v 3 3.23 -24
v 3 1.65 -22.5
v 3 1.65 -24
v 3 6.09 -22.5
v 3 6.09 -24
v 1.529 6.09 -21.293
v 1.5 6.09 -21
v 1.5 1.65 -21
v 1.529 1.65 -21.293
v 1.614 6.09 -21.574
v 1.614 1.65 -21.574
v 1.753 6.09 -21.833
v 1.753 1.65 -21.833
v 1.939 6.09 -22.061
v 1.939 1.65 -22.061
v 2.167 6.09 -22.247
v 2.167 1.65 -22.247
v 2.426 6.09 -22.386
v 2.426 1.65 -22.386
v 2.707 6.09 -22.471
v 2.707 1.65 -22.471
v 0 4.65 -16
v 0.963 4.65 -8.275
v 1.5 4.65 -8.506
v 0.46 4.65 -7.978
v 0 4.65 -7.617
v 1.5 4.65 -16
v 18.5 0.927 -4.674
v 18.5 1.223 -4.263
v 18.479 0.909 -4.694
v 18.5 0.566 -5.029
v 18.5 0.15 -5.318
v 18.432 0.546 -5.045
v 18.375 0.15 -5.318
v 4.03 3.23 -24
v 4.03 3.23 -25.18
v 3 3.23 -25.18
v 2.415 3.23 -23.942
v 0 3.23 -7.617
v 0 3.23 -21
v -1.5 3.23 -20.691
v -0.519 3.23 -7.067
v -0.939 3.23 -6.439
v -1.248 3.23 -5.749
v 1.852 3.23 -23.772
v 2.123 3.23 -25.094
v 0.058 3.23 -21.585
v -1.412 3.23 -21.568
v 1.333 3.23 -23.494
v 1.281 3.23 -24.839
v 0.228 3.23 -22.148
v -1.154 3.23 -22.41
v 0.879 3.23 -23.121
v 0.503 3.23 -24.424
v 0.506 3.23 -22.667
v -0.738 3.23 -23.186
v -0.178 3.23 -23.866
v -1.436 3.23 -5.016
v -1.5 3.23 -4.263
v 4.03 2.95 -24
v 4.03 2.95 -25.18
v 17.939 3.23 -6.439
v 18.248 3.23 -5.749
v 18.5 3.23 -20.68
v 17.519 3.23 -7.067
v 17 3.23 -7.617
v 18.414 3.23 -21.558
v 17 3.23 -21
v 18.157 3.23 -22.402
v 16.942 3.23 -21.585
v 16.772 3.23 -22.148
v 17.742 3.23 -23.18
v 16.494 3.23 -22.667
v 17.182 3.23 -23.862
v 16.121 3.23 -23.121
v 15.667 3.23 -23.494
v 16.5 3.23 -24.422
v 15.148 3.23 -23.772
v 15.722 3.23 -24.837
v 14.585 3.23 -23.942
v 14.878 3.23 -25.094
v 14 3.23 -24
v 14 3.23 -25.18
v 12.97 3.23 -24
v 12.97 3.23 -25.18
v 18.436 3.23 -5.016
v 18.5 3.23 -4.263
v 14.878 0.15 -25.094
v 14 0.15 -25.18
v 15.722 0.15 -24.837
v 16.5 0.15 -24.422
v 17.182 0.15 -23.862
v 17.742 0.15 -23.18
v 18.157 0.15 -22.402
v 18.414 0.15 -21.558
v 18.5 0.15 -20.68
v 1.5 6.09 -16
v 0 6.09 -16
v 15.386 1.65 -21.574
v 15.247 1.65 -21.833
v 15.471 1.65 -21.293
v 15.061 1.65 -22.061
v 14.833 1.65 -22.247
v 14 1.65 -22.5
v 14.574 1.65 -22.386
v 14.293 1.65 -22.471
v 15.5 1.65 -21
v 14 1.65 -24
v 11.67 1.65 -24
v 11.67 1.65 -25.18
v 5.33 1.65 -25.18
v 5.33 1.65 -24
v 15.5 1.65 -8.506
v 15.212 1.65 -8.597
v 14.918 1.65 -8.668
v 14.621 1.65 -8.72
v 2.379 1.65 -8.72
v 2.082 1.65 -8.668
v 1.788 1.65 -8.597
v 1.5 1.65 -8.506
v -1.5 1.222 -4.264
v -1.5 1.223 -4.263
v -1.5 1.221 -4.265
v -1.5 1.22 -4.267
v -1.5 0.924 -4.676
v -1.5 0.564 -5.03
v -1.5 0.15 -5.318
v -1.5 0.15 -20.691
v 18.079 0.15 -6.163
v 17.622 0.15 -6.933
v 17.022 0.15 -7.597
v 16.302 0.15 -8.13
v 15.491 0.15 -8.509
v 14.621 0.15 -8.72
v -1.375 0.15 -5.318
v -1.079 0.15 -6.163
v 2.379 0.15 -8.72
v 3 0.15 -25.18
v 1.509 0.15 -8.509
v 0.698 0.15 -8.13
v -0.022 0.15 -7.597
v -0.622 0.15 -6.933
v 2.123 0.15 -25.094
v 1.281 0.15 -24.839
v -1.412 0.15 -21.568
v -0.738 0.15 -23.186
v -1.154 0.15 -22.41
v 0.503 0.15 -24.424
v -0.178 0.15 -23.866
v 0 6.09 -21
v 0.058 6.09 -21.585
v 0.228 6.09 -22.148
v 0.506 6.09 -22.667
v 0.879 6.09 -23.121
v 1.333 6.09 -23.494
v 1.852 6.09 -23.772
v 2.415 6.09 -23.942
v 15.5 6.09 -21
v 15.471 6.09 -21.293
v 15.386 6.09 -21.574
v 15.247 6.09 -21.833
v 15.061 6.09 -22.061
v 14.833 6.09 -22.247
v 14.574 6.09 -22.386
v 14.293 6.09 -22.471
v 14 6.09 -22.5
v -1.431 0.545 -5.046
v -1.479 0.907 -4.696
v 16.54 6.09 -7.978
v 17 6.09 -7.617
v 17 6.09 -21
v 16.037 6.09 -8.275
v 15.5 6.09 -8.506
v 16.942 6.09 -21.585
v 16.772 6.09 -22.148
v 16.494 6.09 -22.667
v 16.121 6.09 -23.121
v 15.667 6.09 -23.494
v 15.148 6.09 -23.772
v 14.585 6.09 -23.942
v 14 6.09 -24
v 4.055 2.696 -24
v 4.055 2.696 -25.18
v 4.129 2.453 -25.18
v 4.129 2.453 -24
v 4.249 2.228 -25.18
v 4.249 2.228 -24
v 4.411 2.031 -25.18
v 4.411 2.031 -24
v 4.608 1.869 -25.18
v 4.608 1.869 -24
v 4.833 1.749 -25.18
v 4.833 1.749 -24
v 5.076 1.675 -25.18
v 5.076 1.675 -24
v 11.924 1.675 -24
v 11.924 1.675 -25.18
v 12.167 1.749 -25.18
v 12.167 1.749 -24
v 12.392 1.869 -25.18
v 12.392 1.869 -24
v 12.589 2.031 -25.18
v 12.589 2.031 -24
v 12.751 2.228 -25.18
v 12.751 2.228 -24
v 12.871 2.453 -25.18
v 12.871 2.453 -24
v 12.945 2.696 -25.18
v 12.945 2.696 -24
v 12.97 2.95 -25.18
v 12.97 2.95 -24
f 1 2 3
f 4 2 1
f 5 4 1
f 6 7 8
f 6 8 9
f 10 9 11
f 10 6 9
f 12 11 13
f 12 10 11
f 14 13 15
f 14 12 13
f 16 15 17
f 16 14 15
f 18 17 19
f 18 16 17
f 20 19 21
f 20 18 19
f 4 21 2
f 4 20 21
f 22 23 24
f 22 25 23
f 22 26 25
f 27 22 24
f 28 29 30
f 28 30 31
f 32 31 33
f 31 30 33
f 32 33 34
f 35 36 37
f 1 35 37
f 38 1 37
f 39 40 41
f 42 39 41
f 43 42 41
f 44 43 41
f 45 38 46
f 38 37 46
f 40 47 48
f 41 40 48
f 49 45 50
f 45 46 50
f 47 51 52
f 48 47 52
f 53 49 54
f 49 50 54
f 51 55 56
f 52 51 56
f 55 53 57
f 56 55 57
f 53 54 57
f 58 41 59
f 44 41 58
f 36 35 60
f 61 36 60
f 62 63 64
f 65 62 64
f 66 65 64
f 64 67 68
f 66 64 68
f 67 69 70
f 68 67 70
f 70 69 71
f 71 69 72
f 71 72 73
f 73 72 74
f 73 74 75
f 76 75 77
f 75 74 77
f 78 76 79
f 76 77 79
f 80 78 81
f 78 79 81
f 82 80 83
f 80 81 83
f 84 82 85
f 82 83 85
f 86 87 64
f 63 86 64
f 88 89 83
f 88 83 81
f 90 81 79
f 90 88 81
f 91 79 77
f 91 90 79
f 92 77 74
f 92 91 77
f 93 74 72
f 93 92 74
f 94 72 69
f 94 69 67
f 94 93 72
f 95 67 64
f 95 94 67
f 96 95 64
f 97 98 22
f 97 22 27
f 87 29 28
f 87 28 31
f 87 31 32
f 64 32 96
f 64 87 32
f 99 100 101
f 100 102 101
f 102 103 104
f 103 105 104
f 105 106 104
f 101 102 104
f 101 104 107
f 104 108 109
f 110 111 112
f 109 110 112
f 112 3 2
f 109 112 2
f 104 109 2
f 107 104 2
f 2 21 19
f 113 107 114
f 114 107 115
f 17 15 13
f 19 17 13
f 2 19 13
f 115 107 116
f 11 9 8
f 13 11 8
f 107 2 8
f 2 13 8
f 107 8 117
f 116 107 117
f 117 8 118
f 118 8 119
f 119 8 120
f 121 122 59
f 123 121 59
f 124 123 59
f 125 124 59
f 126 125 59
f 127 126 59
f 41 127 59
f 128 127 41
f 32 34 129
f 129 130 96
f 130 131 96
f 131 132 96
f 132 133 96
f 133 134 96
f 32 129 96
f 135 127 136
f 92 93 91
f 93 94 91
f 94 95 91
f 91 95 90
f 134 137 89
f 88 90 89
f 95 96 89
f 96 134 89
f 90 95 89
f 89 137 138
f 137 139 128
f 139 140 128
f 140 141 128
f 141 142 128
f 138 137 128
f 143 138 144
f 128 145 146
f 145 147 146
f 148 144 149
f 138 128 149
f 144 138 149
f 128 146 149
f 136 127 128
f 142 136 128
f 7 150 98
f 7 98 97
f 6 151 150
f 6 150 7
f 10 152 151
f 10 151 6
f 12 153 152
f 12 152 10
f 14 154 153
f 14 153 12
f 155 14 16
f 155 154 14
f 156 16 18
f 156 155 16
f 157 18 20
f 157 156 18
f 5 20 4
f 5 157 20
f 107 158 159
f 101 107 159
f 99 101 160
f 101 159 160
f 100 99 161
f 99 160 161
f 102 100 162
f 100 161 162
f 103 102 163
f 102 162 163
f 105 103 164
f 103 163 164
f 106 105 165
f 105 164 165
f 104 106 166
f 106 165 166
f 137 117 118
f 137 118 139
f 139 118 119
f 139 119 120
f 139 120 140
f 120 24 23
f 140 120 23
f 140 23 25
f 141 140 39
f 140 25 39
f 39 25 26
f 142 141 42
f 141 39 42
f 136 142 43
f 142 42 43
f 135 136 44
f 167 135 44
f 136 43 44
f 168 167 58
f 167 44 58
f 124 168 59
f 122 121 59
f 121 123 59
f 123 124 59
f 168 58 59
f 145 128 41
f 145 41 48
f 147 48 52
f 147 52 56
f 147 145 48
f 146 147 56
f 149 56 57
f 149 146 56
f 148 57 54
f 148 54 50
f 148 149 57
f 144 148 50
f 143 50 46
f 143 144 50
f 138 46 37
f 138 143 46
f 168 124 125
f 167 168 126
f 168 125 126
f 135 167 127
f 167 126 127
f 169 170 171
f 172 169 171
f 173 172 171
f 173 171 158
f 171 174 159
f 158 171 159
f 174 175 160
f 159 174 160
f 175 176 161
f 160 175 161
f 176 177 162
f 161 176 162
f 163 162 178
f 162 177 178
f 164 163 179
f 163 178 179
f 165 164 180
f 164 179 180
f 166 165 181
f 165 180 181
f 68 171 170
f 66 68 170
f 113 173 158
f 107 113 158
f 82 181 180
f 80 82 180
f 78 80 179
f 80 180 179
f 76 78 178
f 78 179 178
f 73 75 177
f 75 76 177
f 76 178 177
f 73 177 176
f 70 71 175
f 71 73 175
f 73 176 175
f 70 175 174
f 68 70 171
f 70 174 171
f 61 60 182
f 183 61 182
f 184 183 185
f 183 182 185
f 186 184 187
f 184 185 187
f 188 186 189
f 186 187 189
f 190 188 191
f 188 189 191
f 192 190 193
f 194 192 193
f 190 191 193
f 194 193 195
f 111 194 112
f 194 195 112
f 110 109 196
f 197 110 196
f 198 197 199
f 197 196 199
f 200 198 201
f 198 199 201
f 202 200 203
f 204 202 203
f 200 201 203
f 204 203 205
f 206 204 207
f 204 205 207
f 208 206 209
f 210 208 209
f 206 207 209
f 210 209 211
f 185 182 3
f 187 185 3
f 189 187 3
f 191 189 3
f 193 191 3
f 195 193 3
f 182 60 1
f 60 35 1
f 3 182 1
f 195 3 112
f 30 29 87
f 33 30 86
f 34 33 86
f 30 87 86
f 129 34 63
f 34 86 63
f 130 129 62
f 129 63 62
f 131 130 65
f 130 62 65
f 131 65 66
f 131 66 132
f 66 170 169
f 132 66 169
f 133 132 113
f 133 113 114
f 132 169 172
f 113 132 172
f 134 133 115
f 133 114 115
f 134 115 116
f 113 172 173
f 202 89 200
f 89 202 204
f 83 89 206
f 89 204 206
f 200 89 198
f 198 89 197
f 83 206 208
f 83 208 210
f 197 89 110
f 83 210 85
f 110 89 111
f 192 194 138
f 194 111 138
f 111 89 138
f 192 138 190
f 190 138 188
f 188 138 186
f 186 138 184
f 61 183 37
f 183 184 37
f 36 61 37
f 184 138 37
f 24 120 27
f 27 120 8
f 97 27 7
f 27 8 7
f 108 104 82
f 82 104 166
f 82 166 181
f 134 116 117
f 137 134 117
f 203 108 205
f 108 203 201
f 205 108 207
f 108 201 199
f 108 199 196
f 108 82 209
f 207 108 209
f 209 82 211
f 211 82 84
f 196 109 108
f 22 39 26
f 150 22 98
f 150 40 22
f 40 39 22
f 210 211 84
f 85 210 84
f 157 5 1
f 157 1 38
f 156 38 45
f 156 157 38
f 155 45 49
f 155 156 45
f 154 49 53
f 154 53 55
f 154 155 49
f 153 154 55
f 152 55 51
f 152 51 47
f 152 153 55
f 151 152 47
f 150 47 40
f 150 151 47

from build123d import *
from OCP.BRepAlgoAPI import BRepAlgoAPI_Cut
from OCP.TopTools import TopTools_ListOfShape

# Parameters (mm, degrees)
BOSS_EXTRUDE6_DEPTH      = 2.5
CUT_EXTRUDE1_DEPTH       = 30.06261
CUT_EXTRUDE1_DEPTH_BACK  = 1.5
BOSS_EXTRUDE7_DEPTH      = 18.5
BOSS_EXTRUDE7_DEPTH_BACK = 1.5
CUT_EXTRUDE2_DEPTH       = 32.362831921
CUT_EXTRUDE2_DEPTH_BACK  = 32.362831921
SKETCH14_R               = 0.75
BOSS_EXTRUDE9_START      = 4.44
SKETCH19_W               = 1.5
SKETCH19_H               = 4
BOSS_EXTRUDE9_DEPTH      = 4.44
SKETCH21_W               = 1.5
SKETCH21_H               = 3
BOSS_EXTRUDE11_DEPTH     = 10
CUT_EXTRUDE3_DEPTH       = 34.819018318
CUT_EXTRUDE3_DEPTH_BACK  = 34.819018318
CUT_EXTRUDE4_DEPTH       = 32.833480802
CUT_EXTRUDE4_DEPTH_BACK  = 32.833480802


with BuildPart() as part:
    # Sketch9 → Boss-Extrude6 (new body)
    with BuildSketch(Plane(origin=(0, 3.23, 0), x_dir=(1, 0, 0), z_dir=(0, 1, 0))):
        with BuildLine():
            Line((3, 25.18), (14, 25.18))
            ThreePointArc((14, 25.18), (17.181980515, 23.861980515), (18.5, 20.68))
            Line((18.5, 20.68), (18.5, 3))
            Line((18.5, 3), (17, 3))
            Line((17, 3), (17, 21))
            ThreePointArc((17, 21), (16.121320344, 23.121320344), (14, 24))
            Line((14, 24), (3, 24))
            ThreePointArc((3, 24), (0.878679656, 23.121320344), (0, 21))
            Line((0, 21), (0, 3))
            Line((0, 3), (-1.5, 3))
            Line((-1.5, 3), (-1.5, 21))
            ThreePointArc((-1.5, 21), (-0.073983127, 23.977063175), (3, 25.18))
        make_face()
    extrude(amount=-BOSS_EXTRUDE6_DEPTH)

    # Sketch7 → Cut-Extrude1 (cut, two sides: drawn at the far end of the back side and taken through both)
    with BuildSketch(Plane(origin=(0, 0, -25.18), x_dir=(-1, 0, 0), z_dir=(0, 0, -1)).offset(-CUT_EXTRUDE1_DEPTH_BACK)):
        with BuildLine():
            Line((-12.97, 3.23), (-4.03, 3.23))
            Line((-4.03, 3.23), (-4.03, 2.95))
            ThreePointArc((-4.03, 2.95), (-4.410761184, 2.030761184), (-5.33, 1.65))
            Line((-5.33, 1.65), (-11.67, 1.65))
            ThreePointArc((-11.67, 1.65), (-12.589238816, 2.030761184), (-12.97, 2.95))
            Line((-12.97, 2.95), (-12.97, 3.23))
        make_face()
    extrude(amount=CUT_EXTRUDE1_DEPTH + CUT_EXTRUDE1_DEPTH_BACK, mode=Mode.SUBTRACT)

    # Sketch12 → Boss-Extrude7 (add, two sides: drawn at the far end of the back side and taken through both)
    with BuildSketch(Plane(origin=(0, 0, 0), x_dir=(0, 0, -1), z_dir=(1, 0, 0)).offset(-BOSS_EXTRUDE7_DEPTH_BACK)):
        Polygon((6.787278953, 1.65), (1.644409133, 1.65), (1.644409133, 0.15), (8.72, 0.15), (25.18, 0.15), (25.18, 1.65), align=None)
    extrude(amount=BOSS_EXTRUDE7_DEPTH + BOSS_EXTRUDE7_DEPTH_BACK)

    # Sketch14 → Cut-Extrude2 (cut, two sides: drawn at the far end of the back side and taken through both)
    # profile 1 of 5: a face of its own
    with BuildSketch(Plane(origin=(0, 2.86, 0), x_dir=(1, 0, 0), z_dir=(0, 1, 0)).offset(-CUT_EXTRUDE2_DEPTH_BACK)):
        Polygon((14.01139117, 26.68), (3.013153393, 26.68), (2.986846607, 26.68), (-3, 26.68), (-3, 21.049560468), (-3, 3), (-3, -2.88), (-3, -8.88), (3, -8.88), (13.998237777, -8.88), (14.024544563, -8.88), (20, -8.88), (20, -3.249560468), (20, 2.630439532), (20, 20.68), (20, 26.68), align=None)
        with BuildLine():
            Line((14, -7.38), (3, -7.38))
            ThreePointArc((3, -7.38), (-0.181980515, -6.061980515), (-1.5, -2.88))
            Line((-1.5, -2.88), (-1.5, 3))
            Line((-1.5, 3), (-1.499971165, 20.691405551))
            ThreePointArc((-1.499971165, 20.691405551), (-0.177940395, 23.866009567), (3, 25.18))
            Line((3, 25.18), (14, 25.18))
            ThreePointArc((14, 25.18), (17.181980515, 23.861980515), (18.5, 20.68))
            Line((18.5, 20.68), (18.5, 3))
            Line((18.5, 3), (18.5, -2.88))
            ThreePointArc((18.5, -2.88), (17.181980515, -6.061980515), (14, -7.38))
        make_face(mode=Mode.SUBTRACT)
    # profile 2 of 5: a face of its own
    with BuildSketch(Plane(origin=(0, 2.86, 0), x_dir=(1, 0, 0), z_dir=(0, 1, 0)).offset(-CUT_EXTRUDE2_DEPTH_BACK)):
        with Locations((4.75, 1.52)):
            Circle(SKETCH14_R)
    # profile 3 of 5: a face of its own
    with BuildSketch(Plane(origin=(0, 2.86, 0), x_dir=(1, 0, 0), z_dir=(0, 1, 0)).offset(-CUT_EXTRUDE2_DEPTH_BACK)):
        with Locations((7.25, 1.52)):
            Circle(SKETCH14_R)
    # profile 4 of 5: a face of its own
    with BuildSketch(Plane(origin=(0, 2.86, 0), x_dir=(1, 0, 0), z_dir=(0, 1, 0)).offset(-CUT_EXTRUDE2_DEPTH_BACK)):
        with Locations((9.75, 1.52)):
            Circle(SKETCH14_R)
    # profile 5 of 5: a face of its own
    with BuildSketch(Plane(origin=(0, 2.86, 0), x_dir=(1, 0, 0), z_dir=(0, 1, 0)).offset(-CUT_EXTRUDE2_DEPTH_BACK)):
        with Locations((12.25, 1.52)):
            Circle(SKETCH14_R)
    extrude(amount=CUT_EXTRUDE2_DEPTH + CUT_EXTRUDE2_DEPTH_BACK, mode=Mode.SUBTRACT)

    # Sketch19 → Boss-Extrude9 (add)
    with BuildSketch(Plane(origin=(0, 1.65, 0), x_dir=(1, 0, 0), z_dir=(0, 1, 0)).offset(BOSS_EXTRUDE9_START)):
        with BuildLine():
            Line((17, 21), (17, 16))
            Line((17, 16), (17, 7))
            Line((17, 7), (17, 3))
            Line((17, 3), (15.5, 3))
            Line((15.5, 3), (15.5, 7))
            Line((15.5, 7), (15.5, 16))
            Line((15.5, 16), (15.5, 21))
            ThreePointArc((15.5, 21), (15.060660172, 22.060660172), (14, 22.5))
            Line((14, 22.5), (14, 24))
            ThreePointArc((14, 24), (16.121320344, 23.121320344), (17, 21))
        make_face()
        with BuildLine():
            Line((0, 21), (0, 16))
            Line((0, 16), (1.5, 16))
            Line((1.5, 16), (1.5, 21))
            ThreePointArc((1.5, 21), (1.939339828, 22.060660172), (3, 22.5))
            Line((3, 22.5), (3, 24))
            ThreePointArc((3, 24), (0.878679656, 23.121320344), (0, 21))
        make_face()
        with Locations((0.75, 5)):
            Rectangle(SKETCH19_W, SKETCH19_H)
    extrude(amount=-BOSS_EXTRUDE9_DEPTH)

    # Sketch21 → Boss-Extrude11 (add)
    with BuildSketch(Plane.XY.offset(-16)):
        with Locations((0.75, 3.15)):
            Rectangle(SKETCH21_W, SKETCH21_H)
    extrude(amount=BOSS_EXTRUDE11_DEPTH)


with BuildPart() as cut_extrude3_tool:
    # Sketch17 → Cut-Extrude3 (new, two sides: drawn at the far end of the back side and taken through both)
    with BuildSketch(Plane(origin=(0, -6.85, 0), x_dir=(-1, 0, 0), z_dir=(0, -1, 0)).offset(-CUT_EXTRUDE3_DEPTH_BACK)):
        with BuildLine():
            Line((-14.620622145, 8.72), (-2.379377855, 8.72))
            ThreePointArc((-2.379377855, 8.72), (0.394318757, 7.217422785), (1.5, 4.263002339))
            Line((1.5, 4.263002339), (1.5, -1.5))
            Line((1.5, -1.5), (-18.5, -1.5))
            Line((-18.5, -1.5), (-18.5, 4.263002339))
            ThreePointArc((-18.5, 4.263002339), (-17.394318757, 7.217422785), (-14.620622145, 8.72))
        make_face()
    extrude(amount=CUT_EXTRUDE3_DEPTH + CUT_EXTRUDE3_DEPTH_BACK)


with BuildPart() as part_1:
    add(part.part)

    # Cut-Extrude3: cut by cut_extrude3_tool, with a tolerance
    cut_extrude3_stock = TopTools_ListOfShape()
    cut_extrude3_stock.Append(part_1.part.wrapped)
    cut_extrude3_tools = TopTools_ListOfShape()
    cut_extrude3_tools.Append(cut_extrude3_tool.part.wrapped)
    cut_extrude3_cut = BRepAlgoAPI_Cut()
    cut_extrude3_cut.SetArguments(cut_extrude3_stock)
    cut_extrude3_cut.SetTools(cut_extrude3_tools)
    cut_extrude3_cut.SetFuzzyValue(0.00001)
    cut_extrude3_cut.Build()
    add(Compound.cast(cut_extrude3_cut.Shape()).solids(), mode=Mode.REPLACE)

    # Sketch20 → Cut-Extrude4 (cut, two sides: drawn at the far end of the back side and taken through both)
    with BuildSketch(Plane(origin=(0, 0, 0), x_dir=(0, 0, -1), z_dir=(1, 0, 0)).offset(-CUT_EXTRUDE4_DEPTH_BACK)):
        with BuildLine():
            Line((-1.38, 1.65), (0.12, 1.65))
            Line((0.12, 1.65), (2.72, 1.65))
            ThreePointArc((2.72, 1.65), (4.841320344, 0.771320344), (5.72, -1.35))
            Line((5.72, -1.35), (5.72, -6.35))
            Line((5.72, -6.35), (5.72, -7.888681431))
            Line((5.72, -7.888681431), (-4.38, -7.888681431))
            Line((-4.38, -7.888681431), (-4.38, -6.35))
            Line((-4.38, -6.35), (-4.38, -1.35))
            ThreePointArc((-4.38, -1.35), (-3.501320344, 0.771320344), (-1.38, 1.65))
        make_face()
    extrude(amount=CUT_EXTRUDE4_DEPTH + CUT_EXTRUDE4_DEPTH_BACK, mode=Mode.SUBTRACT)


solid = part_1.part
